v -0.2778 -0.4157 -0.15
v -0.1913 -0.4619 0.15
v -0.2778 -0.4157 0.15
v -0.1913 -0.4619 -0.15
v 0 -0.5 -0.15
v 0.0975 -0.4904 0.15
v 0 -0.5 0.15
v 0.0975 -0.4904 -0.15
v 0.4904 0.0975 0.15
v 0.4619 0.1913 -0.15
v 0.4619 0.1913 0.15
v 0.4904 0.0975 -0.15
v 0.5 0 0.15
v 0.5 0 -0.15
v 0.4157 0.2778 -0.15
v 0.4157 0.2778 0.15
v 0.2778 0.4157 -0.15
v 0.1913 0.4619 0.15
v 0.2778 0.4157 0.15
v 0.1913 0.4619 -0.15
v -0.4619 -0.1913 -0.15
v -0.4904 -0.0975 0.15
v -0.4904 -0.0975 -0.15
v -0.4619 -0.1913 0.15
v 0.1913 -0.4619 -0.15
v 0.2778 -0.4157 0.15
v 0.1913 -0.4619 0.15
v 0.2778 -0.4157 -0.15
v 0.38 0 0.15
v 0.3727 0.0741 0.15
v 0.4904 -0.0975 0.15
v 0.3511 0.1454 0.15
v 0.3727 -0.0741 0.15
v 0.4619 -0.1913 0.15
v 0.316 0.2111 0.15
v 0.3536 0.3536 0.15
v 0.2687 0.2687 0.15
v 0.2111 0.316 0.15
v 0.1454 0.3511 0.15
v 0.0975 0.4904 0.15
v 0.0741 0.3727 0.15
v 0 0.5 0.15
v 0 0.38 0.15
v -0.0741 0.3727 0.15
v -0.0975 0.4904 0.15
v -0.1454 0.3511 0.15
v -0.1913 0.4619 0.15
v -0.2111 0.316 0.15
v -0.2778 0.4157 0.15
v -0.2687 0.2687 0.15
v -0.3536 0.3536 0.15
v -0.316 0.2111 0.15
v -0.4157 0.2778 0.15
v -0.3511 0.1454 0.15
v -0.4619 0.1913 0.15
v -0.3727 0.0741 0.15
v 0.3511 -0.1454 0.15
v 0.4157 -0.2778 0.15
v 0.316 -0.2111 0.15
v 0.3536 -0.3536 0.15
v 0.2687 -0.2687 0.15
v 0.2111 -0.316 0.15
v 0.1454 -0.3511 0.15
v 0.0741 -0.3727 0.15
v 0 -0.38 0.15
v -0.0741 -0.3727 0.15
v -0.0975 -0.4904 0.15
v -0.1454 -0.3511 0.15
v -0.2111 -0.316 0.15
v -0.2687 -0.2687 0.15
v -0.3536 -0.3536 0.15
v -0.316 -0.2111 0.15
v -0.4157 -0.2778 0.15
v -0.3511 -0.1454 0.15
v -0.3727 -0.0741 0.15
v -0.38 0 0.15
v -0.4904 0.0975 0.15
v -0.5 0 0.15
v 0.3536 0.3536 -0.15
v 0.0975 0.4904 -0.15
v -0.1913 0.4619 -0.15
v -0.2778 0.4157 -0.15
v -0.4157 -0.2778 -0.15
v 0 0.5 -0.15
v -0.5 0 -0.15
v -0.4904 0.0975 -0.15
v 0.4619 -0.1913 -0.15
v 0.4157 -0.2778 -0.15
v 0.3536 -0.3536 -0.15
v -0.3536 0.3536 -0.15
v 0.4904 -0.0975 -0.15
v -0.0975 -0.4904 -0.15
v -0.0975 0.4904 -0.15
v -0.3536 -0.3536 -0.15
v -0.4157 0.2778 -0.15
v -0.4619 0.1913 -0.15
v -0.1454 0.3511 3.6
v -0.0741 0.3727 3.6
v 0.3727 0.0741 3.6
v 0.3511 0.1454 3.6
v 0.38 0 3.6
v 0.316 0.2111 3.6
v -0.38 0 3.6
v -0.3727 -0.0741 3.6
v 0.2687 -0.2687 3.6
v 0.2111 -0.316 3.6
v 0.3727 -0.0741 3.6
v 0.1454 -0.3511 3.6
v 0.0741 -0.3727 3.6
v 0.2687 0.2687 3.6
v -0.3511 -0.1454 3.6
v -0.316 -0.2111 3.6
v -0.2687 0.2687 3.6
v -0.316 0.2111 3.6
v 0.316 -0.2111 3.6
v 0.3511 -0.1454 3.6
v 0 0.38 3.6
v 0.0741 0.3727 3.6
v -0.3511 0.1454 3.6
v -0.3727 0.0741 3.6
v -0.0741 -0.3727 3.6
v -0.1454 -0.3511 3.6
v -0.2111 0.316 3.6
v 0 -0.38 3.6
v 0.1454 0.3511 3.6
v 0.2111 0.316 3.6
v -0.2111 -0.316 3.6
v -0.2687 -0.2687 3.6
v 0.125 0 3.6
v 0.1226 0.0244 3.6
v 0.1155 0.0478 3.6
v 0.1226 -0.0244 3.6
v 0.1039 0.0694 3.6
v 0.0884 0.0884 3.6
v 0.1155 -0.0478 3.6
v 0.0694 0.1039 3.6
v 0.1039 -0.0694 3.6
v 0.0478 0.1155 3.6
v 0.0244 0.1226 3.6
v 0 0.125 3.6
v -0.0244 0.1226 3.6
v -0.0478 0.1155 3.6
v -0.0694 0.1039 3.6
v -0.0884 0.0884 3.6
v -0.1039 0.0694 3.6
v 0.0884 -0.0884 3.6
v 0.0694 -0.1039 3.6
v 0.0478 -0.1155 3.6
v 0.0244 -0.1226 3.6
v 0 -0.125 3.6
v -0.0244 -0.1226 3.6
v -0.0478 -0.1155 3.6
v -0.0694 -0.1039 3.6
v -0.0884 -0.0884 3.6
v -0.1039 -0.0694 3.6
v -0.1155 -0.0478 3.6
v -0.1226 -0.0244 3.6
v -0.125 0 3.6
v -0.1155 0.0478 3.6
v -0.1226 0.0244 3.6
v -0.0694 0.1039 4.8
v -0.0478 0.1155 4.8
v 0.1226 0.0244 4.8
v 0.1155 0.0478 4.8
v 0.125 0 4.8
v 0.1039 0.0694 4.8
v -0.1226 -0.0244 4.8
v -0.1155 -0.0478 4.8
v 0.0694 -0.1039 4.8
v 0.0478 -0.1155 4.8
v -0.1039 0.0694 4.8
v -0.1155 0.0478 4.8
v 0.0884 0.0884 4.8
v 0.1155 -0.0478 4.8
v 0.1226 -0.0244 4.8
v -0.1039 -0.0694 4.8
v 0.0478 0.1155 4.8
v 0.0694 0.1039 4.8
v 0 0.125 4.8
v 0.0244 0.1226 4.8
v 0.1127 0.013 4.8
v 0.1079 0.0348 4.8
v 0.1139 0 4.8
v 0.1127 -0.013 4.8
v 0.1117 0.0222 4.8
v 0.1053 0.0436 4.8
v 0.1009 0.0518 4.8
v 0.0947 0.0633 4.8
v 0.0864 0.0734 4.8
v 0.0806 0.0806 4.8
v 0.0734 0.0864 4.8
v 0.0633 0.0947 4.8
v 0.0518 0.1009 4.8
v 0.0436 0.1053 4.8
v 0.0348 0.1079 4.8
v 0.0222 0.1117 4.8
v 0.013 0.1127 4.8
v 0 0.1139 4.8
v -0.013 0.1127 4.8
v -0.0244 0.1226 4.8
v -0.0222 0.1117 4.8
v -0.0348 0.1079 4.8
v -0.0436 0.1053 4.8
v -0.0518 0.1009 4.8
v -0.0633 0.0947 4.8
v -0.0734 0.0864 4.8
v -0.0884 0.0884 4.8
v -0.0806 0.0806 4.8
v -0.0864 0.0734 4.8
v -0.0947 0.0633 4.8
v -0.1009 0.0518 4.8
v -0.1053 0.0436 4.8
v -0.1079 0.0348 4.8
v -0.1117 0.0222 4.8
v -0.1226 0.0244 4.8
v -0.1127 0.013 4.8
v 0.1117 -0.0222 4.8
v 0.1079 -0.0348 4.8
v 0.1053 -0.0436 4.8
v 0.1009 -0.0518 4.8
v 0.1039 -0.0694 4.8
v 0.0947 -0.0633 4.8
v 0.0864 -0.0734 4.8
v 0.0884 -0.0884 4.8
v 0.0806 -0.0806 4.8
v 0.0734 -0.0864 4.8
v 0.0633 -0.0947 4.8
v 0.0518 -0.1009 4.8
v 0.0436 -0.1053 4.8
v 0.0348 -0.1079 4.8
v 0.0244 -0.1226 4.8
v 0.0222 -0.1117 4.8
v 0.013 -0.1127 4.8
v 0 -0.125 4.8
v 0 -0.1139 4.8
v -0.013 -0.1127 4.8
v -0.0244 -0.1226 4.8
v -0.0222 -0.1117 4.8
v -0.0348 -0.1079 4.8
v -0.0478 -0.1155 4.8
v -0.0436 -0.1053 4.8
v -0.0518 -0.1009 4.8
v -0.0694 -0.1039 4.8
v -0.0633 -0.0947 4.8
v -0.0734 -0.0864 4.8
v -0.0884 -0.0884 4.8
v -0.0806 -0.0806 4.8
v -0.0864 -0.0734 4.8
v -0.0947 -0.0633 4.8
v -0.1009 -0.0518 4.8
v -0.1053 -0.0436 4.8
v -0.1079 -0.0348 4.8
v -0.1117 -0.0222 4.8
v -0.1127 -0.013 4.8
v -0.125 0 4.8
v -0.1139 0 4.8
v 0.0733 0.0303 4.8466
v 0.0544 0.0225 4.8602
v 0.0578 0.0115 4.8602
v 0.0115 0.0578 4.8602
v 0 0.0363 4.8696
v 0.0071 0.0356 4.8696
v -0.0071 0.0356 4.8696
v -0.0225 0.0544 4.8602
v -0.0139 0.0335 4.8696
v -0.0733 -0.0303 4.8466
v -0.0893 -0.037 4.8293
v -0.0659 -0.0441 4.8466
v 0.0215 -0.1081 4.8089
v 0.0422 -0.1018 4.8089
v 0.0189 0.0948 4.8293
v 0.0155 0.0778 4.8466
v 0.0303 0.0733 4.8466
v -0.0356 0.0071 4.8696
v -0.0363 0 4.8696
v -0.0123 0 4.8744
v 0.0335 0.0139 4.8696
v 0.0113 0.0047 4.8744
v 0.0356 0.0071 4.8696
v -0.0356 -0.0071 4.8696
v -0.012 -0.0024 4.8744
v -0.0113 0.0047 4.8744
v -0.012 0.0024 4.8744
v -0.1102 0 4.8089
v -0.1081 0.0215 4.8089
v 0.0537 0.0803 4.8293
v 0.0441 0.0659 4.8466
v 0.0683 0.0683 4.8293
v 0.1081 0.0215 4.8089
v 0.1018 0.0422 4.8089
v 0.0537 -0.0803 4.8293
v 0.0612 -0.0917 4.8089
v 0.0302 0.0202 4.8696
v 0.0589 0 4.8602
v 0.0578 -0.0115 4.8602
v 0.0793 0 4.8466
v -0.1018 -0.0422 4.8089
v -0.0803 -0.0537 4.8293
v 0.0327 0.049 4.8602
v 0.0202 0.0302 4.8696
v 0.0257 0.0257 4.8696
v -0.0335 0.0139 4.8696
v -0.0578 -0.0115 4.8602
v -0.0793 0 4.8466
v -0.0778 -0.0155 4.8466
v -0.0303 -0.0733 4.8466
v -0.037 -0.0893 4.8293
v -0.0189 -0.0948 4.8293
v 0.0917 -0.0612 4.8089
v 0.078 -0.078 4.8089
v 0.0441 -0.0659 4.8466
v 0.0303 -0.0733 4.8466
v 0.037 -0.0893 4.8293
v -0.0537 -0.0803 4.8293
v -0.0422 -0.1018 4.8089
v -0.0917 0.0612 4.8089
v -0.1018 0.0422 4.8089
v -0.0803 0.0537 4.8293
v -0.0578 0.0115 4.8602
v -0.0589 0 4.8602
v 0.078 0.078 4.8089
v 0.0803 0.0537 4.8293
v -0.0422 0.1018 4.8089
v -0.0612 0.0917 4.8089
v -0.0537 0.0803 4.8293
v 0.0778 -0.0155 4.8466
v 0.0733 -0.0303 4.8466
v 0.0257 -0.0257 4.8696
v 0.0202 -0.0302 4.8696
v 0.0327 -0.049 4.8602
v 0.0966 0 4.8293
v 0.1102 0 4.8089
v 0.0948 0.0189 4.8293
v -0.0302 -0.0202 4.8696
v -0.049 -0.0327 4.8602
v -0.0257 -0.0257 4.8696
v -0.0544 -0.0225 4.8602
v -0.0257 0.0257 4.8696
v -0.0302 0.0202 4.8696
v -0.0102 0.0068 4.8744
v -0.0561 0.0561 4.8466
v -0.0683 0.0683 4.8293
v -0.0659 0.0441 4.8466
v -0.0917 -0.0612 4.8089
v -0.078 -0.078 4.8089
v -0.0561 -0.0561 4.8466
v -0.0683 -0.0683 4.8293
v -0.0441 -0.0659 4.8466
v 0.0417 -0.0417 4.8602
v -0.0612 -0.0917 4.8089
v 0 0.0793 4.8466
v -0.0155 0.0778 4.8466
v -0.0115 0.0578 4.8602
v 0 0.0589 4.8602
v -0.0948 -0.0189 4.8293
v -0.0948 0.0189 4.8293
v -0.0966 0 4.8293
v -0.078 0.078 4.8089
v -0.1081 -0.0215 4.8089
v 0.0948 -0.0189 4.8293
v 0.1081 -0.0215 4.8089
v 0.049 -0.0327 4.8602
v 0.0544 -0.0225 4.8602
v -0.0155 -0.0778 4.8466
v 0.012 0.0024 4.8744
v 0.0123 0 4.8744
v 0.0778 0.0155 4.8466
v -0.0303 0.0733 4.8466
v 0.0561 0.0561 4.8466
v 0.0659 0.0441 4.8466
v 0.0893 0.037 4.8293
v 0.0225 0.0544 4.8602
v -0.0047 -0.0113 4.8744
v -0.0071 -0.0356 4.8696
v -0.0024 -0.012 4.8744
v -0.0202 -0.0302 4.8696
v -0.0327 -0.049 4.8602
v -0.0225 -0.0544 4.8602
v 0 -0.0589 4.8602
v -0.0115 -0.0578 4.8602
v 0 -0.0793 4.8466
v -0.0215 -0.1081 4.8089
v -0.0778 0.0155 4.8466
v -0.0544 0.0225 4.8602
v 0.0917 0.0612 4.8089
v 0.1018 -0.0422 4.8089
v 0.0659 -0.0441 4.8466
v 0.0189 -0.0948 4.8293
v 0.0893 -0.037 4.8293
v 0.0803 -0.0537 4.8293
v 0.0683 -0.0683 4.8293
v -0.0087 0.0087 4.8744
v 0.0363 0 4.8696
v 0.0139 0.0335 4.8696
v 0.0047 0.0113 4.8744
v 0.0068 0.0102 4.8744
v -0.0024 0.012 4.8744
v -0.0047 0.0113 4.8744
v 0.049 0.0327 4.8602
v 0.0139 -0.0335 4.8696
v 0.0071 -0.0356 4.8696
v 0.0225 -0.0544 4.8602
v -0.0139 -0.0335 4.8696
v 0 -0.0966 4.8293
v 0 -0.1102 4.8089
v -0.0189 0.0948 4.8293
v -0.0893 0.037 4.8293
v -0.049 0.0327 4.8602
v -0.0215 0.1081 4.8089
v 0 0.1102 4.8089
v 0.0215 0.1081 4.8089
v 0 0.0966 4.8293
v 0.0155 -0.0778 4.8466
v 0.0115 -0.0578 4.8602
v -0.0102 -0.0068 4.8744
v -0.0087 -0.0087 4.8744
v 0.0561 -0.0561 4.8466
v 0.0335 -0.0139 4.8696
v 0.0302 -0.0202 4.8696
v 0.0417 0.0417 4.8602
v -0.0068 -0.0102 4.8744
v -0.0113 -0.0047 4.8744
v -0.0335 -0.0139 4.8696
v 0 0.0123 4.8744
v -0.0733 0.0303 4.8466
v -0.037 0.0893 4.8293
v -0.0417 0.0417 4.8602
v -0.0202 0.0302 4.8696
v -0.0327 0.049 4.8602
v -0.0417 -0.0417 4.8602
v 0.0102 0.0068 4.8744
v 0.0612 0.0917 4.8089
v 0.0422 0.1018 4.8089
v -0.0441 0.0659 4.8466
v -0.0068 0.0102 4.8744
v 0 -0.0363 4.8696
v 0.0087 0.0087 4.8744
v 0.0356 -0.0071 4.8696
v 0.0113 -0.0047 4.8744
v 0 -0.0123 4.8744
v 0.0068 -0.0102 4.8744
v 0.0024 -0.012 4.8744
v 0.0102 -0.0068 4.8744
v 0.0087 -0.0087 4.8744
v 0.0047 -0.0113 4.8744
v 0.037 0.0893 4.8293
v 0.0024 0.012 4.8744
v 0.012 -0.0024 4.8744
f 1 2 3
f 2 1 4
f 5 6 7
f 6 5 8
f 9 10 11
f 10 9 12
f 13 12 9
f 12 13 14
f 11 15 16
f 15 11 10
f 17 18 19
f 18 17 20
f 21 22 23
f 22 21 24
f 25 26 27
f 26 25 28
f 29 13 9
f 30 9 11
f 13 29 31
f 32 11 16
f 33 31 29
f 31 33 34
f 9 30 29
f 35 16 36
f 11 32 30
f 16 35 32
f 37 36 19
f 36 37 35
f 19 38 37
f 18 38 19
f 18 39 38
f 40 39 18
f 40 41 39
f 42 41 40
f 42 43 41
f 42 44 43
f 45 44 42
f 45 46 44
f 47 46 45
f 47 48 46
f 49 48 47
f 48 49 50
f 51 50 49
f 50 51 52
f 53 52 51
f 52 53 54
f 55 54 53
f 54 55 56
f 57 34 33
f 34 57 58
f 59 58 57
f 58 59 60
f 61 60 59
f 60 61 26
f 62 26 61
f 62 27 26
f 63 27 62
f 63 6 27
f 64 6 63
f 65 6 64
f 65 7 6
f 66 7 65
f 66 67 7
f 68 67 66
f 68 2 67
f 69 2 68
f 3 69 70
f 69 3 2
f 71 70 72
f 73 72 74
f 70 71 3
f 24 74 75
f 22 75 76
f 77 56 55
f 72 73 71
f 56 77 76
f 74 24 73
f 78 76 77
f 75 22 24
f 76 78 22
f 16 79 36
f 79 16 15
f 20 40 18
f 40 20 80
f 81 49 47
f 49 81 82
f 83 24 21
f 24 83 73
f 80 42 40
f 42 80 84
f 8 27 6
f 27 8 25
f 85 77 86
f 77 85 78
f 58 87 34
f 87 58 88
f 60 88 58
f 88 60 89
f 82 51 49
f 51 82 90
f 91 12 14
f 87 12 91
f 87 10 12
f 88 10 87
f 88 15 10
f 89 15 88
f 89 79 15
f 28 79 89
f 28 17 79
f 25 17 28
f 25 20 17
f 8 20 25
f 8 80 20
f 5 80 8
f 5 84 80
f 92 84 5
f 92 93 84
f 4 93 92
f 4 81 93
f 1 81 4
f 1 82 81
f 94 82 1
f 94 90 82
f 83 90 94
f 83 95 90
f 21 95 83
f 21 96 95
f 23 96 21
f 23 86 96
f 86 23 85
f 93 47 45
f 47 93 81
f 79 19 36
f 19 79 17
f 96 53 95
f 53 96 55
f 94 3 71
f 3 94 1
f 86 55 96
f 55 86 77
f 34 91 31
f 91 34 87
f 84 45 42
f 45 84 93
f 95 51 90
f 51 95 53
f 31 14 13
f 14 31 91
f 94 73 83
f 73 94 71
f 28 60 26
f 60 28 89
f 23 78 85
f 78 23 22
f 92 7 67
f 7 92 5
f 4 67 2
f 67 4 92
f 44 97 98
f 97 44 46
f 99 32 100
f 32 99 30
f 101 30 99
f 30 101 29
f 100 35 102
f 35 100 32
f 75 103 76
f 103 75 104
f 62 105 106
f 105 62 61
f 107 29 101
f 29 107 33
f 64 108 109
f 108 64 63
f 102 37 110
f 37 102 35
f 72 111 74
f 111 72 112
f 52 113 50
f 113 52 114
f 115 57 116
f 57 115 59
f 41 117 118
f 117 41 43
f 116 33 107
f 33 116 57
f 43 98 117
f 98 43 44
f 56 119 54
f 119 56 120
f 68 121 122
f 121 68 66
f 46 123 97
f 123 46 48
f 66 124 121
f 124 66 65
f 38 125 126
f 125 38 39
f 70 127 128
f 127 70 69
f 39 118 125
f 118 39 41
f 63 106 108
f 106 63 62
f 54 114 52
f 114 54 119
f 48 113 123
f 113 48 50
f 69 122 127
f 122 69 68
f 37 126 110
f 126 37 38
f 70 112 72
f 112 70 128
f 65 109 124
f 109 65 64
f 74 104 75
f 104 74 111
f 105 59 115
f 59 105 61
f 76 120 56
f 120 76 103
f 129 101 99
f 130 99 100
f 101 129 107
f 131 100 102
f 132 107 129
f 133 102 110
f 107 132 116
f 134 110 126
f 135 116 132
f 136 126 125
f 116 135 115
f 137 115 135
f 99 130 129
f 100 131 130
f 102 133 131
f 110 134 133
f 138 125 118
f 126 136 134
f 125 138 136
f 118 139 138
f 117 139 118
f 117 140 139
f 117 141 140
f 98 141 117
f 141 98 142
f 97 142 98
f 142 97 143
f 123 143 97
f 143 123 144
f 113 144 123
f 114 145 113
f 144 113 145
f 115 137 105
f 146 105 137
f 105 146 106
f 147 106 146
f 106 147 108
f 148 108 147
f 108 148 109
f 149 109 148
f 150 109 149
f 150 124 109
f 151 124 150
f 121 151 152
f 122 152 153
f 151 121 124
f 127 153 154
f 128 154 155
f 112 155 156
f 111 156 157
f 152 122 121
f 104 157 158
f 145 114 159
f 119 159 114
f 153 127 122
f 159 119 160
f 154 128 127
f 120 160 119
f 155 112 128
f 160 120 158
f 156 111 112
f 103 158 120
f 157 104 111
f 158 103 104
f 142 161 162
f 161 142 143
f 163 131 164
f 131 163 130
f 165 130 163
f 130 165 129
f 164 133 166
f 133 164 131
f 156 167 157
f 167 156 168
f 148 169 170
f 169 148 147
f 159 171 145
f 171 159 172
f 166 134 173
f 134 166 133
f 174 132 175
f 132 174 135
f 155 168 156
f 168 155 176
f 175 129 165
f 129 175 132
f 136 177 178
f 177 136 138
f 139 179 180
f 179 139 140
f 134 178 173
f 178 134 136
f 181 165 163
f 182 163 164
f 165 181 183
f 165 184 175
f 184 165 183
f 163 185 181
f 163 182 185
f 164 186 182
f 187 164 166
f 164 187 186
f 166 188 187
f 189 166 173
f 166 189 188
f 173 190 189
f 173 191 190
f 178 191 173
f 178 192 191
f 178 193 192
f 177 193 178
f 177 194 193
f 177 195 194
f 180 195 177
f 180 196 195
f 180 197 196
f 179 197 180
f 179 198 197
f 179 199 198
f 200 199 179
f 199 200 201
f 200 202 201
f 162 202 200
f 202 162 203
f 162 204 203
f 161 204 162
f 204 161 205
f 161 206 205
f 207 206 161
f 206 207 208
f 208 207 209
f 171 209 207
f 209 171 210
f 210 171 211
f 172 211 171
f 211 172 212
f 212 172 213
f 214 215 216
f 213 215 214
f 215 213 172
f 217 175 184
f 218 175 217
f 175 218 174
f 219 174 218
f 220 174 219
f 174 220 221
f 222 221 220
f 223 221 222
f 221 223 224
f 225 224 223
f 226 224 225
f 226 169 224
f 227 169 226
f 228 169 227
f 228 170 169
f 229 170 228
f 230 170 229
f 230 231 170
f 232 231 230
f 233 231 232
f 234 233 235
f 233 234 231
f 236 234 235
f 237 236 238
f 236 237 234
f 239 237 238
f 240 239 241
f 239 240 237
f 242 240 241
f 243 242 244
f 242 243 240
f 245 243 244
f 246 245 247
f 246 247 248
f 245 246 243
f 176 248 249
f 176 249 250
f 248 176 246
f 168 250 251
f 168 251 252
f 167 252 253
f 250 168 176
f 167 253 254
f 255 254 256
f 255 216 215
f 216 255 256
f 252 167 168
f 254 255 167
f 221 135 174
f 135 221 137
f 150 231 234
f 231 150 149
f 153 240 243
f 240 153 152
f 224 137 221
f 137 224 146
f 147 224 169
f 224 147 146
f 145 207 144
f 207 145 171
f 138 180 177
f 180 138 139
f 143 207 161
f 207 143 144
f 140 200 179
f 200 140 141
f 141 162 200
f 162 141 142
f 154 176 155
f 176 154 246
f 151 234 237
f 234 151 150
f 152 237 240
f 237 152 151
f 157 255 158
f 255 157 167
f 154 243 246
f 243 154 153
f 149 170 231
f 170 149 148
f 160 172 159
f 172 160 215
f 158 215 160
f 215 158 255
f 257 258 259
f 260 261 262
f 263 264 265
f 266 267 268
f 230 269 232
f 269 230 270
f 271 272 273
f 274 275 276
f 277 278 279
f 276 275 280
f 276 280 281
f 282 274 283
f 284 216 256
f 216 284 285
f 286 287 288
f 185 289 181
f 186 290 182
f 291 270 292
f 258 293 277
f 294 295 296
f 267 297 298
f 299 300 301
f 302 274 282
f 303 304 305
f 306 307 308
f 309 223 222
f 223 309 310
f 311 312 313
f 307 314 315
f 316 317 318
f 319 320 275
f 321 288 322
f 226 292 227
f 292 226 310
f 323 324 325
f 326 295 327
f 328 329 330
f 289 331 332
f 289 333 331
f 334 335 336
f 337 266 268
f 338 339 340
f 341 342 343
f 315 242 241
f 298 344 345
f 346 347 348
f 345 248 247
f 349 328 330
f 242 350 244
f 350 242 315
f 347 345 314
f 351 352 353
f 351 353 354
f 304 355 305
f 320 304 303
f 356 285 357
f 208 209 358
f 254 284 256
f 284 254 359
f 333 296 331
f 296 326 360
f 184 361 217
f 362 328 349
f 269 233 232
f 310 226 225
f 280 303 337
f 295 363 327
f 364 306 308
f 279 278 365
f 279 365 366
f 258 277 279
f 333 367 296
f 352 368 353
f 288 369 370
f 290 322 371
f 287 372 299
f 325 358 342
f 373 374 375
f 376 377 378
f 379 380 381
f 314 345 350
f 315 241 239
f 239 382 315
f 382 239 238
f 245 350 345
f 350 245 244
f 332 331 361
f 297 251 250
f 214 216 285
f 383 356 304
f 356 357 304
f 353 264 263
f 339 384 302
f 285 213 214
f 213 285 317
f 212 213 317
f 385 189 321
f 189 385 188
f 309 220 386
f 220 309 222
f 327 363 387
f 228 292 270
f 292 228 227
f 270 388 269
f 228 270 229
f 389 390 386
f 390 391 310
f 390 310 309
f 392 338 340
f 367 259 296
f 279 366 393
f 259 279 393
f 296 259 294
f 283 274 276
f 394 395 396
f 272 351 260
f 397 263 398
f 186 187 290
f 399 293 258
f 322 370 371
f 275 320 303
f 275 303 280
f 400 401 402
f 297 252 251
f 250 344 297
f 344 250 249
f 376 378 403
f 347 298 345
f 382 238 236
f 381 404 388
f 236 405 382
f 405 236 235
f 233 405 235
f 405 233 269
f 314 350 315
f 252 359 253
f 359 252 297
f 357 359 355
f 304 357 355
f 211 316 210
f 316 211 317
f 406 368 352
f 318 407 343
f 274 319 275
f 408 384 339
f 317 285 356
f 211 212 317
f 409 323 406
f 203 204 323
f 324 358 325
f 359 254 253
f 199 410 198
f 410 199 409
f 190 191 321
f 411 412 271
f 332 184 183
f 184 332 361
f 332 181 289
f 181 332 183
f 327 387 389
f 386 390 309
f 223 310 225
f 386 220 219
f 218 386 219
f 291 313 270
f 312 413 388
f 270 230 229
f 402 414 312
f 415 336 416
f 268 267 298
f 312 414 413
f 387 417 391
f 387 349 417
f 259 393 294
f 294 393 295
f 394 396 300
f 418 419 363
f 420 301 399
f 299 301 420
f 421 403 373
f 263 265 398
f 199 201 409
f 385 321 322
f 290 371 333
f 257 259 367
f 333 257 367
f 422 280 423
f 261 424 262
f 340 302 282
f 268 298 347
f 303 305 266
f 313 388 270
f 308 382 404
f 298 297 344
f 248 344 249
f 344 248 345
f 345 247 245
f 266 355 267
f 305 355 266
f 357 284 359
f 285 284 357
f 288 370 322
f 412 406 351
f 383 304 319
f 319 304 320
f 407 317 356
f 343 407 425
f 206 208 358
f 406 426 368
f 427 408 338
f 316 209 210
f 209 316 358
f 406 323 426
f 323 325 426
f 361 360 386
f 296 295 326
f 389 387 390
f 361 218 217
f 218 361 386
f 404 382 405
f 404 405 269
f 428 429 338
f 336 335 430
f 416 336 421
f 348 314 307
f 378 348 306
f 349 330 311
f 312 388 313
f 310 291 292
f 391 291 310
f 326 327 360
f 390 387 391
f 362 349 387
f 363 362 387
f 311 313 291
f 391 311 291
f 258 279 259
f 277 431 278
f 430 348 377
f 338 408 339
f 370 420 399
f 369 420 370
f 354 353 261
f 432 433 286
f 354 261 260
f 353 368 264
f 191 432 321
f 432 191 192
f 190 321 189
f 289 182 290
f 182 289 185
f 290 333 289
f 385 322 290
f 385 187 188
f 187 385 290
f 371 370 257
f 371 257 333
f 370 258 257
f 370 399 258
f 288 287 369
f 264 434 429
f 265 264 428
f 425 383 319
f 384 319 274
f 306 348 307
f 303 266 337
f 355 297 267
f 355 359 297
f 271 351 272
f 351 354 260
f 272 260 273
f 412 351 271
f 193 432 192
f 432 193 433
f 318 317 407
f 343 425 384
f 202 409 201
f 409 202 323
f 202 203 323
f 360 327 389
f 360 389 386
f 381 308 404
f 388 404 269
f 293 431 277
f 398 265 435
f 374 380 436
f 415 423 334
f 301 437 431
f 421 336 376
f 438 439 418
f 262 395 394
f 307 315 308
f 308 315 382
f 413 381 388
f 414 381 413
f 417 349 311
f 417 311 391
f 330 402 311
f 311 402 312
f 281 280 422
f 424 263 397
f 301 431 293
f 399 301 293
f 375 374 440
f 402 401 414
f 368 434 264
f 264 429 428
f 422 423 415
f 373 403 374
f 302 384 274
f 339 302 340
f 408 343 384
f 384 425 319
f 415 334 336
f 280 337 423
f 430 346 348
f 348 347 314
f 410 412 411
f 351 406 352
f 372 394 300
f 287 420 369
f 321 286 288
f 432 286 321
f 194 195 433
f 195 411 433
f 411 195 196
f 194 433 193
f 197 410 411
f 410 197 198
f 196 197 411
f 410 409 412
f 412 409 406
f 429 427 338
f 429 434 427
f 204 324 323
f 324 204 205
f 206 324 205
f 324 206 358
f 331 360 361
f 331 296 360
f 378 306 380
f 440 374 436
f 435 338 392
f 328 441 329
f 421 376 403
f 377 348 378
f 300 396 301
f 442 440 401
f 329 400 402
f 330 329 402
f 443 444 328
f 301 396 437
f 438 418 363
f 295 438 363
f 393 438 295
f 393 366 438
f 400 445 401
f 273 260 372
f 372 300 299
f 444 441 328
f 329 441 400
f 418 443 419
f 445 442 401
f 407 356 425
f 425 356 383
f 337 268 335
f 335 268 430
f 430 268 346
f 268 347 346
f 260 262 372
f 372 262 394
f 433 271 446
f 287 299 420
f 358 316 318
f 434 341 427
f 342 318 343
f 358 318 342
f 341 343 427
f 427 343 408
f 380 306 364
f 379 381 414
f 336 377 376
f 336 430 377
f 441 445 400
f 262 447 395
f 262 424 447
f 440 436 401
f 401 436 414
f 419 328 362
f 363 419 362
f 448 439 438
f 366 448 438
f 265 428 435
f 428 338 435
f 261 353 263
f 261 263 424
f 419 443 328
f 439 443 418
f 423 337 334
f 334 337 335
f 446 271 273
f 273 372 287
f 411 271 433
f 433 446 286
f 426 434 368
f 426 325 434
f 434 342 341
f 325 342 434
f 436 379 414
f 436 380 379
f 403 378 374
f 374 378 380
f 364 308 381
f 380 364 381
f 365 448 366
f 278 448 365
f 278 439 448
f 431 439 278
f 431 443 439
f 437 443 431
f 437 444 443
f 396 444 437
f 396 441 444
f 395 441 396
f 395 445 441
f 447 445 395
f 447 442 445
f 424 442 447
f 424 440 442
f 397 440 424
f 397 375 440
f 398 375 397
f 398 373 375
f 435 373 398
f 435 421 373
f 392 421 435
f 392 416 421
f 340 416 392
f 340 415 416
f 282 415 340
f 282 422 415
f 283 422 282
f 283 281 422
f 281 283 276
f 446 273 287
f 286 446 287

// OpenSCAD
// Parameters
body_diameter = 0.76; //[0.38:1.52:0.01]
body_height = 3.5; //[1.75:7:0.05]
overall_height = 4.7; //[2.35:9.4:0.05]
lever_height = 1.2; //[0.6:2.4:0.05]
lever_diameter = 0.25; //[0.12:0.5:0.01]
base_flange_diameter = 1; //[0.5:2:0.05]
base_flange_thickness = 0.3; //[0.15:0.6:0.01]
connect_overlap = 0.05; //[0.02:0.2:0.01]

// Toggle switch - complete geometry
module toggle() {
  union() {
    // Base flange
    color("Silver") {
      translate([0, 0, 0])
        cylinder(r=base_flange_diameter/2, h=base_flange_thickness, center=true, $fn=32);
    }
    // Cylindrical body
    color("DimGray") {
      translate([0, 0, base_flange_thickness/2 + body_height/2 - connect_overlap])
        cylinder(r=body_diameter/2, h=body_height, center=true, $fn=32);
    }
    // Actuator lever
    color("Black") {
      translate([0, 0, base_flange_thickness/2 + body_height - connect_overlap + lever_height/2])
        cylinder(r=lever_diameter/2, h=lever_height, center=true, $fn=32);
    }
    // Toggle sphere
    color("Black") {
      translate([0, 0, base_flange_thickness/2 + body_height - connect_overlap + lever_height - connect_overlap])
        sphere(r=lever_diameter/2, $fn=32);
    }
  }
}

// Assembly
module assembly() {
  toggle();
}

assembly();
